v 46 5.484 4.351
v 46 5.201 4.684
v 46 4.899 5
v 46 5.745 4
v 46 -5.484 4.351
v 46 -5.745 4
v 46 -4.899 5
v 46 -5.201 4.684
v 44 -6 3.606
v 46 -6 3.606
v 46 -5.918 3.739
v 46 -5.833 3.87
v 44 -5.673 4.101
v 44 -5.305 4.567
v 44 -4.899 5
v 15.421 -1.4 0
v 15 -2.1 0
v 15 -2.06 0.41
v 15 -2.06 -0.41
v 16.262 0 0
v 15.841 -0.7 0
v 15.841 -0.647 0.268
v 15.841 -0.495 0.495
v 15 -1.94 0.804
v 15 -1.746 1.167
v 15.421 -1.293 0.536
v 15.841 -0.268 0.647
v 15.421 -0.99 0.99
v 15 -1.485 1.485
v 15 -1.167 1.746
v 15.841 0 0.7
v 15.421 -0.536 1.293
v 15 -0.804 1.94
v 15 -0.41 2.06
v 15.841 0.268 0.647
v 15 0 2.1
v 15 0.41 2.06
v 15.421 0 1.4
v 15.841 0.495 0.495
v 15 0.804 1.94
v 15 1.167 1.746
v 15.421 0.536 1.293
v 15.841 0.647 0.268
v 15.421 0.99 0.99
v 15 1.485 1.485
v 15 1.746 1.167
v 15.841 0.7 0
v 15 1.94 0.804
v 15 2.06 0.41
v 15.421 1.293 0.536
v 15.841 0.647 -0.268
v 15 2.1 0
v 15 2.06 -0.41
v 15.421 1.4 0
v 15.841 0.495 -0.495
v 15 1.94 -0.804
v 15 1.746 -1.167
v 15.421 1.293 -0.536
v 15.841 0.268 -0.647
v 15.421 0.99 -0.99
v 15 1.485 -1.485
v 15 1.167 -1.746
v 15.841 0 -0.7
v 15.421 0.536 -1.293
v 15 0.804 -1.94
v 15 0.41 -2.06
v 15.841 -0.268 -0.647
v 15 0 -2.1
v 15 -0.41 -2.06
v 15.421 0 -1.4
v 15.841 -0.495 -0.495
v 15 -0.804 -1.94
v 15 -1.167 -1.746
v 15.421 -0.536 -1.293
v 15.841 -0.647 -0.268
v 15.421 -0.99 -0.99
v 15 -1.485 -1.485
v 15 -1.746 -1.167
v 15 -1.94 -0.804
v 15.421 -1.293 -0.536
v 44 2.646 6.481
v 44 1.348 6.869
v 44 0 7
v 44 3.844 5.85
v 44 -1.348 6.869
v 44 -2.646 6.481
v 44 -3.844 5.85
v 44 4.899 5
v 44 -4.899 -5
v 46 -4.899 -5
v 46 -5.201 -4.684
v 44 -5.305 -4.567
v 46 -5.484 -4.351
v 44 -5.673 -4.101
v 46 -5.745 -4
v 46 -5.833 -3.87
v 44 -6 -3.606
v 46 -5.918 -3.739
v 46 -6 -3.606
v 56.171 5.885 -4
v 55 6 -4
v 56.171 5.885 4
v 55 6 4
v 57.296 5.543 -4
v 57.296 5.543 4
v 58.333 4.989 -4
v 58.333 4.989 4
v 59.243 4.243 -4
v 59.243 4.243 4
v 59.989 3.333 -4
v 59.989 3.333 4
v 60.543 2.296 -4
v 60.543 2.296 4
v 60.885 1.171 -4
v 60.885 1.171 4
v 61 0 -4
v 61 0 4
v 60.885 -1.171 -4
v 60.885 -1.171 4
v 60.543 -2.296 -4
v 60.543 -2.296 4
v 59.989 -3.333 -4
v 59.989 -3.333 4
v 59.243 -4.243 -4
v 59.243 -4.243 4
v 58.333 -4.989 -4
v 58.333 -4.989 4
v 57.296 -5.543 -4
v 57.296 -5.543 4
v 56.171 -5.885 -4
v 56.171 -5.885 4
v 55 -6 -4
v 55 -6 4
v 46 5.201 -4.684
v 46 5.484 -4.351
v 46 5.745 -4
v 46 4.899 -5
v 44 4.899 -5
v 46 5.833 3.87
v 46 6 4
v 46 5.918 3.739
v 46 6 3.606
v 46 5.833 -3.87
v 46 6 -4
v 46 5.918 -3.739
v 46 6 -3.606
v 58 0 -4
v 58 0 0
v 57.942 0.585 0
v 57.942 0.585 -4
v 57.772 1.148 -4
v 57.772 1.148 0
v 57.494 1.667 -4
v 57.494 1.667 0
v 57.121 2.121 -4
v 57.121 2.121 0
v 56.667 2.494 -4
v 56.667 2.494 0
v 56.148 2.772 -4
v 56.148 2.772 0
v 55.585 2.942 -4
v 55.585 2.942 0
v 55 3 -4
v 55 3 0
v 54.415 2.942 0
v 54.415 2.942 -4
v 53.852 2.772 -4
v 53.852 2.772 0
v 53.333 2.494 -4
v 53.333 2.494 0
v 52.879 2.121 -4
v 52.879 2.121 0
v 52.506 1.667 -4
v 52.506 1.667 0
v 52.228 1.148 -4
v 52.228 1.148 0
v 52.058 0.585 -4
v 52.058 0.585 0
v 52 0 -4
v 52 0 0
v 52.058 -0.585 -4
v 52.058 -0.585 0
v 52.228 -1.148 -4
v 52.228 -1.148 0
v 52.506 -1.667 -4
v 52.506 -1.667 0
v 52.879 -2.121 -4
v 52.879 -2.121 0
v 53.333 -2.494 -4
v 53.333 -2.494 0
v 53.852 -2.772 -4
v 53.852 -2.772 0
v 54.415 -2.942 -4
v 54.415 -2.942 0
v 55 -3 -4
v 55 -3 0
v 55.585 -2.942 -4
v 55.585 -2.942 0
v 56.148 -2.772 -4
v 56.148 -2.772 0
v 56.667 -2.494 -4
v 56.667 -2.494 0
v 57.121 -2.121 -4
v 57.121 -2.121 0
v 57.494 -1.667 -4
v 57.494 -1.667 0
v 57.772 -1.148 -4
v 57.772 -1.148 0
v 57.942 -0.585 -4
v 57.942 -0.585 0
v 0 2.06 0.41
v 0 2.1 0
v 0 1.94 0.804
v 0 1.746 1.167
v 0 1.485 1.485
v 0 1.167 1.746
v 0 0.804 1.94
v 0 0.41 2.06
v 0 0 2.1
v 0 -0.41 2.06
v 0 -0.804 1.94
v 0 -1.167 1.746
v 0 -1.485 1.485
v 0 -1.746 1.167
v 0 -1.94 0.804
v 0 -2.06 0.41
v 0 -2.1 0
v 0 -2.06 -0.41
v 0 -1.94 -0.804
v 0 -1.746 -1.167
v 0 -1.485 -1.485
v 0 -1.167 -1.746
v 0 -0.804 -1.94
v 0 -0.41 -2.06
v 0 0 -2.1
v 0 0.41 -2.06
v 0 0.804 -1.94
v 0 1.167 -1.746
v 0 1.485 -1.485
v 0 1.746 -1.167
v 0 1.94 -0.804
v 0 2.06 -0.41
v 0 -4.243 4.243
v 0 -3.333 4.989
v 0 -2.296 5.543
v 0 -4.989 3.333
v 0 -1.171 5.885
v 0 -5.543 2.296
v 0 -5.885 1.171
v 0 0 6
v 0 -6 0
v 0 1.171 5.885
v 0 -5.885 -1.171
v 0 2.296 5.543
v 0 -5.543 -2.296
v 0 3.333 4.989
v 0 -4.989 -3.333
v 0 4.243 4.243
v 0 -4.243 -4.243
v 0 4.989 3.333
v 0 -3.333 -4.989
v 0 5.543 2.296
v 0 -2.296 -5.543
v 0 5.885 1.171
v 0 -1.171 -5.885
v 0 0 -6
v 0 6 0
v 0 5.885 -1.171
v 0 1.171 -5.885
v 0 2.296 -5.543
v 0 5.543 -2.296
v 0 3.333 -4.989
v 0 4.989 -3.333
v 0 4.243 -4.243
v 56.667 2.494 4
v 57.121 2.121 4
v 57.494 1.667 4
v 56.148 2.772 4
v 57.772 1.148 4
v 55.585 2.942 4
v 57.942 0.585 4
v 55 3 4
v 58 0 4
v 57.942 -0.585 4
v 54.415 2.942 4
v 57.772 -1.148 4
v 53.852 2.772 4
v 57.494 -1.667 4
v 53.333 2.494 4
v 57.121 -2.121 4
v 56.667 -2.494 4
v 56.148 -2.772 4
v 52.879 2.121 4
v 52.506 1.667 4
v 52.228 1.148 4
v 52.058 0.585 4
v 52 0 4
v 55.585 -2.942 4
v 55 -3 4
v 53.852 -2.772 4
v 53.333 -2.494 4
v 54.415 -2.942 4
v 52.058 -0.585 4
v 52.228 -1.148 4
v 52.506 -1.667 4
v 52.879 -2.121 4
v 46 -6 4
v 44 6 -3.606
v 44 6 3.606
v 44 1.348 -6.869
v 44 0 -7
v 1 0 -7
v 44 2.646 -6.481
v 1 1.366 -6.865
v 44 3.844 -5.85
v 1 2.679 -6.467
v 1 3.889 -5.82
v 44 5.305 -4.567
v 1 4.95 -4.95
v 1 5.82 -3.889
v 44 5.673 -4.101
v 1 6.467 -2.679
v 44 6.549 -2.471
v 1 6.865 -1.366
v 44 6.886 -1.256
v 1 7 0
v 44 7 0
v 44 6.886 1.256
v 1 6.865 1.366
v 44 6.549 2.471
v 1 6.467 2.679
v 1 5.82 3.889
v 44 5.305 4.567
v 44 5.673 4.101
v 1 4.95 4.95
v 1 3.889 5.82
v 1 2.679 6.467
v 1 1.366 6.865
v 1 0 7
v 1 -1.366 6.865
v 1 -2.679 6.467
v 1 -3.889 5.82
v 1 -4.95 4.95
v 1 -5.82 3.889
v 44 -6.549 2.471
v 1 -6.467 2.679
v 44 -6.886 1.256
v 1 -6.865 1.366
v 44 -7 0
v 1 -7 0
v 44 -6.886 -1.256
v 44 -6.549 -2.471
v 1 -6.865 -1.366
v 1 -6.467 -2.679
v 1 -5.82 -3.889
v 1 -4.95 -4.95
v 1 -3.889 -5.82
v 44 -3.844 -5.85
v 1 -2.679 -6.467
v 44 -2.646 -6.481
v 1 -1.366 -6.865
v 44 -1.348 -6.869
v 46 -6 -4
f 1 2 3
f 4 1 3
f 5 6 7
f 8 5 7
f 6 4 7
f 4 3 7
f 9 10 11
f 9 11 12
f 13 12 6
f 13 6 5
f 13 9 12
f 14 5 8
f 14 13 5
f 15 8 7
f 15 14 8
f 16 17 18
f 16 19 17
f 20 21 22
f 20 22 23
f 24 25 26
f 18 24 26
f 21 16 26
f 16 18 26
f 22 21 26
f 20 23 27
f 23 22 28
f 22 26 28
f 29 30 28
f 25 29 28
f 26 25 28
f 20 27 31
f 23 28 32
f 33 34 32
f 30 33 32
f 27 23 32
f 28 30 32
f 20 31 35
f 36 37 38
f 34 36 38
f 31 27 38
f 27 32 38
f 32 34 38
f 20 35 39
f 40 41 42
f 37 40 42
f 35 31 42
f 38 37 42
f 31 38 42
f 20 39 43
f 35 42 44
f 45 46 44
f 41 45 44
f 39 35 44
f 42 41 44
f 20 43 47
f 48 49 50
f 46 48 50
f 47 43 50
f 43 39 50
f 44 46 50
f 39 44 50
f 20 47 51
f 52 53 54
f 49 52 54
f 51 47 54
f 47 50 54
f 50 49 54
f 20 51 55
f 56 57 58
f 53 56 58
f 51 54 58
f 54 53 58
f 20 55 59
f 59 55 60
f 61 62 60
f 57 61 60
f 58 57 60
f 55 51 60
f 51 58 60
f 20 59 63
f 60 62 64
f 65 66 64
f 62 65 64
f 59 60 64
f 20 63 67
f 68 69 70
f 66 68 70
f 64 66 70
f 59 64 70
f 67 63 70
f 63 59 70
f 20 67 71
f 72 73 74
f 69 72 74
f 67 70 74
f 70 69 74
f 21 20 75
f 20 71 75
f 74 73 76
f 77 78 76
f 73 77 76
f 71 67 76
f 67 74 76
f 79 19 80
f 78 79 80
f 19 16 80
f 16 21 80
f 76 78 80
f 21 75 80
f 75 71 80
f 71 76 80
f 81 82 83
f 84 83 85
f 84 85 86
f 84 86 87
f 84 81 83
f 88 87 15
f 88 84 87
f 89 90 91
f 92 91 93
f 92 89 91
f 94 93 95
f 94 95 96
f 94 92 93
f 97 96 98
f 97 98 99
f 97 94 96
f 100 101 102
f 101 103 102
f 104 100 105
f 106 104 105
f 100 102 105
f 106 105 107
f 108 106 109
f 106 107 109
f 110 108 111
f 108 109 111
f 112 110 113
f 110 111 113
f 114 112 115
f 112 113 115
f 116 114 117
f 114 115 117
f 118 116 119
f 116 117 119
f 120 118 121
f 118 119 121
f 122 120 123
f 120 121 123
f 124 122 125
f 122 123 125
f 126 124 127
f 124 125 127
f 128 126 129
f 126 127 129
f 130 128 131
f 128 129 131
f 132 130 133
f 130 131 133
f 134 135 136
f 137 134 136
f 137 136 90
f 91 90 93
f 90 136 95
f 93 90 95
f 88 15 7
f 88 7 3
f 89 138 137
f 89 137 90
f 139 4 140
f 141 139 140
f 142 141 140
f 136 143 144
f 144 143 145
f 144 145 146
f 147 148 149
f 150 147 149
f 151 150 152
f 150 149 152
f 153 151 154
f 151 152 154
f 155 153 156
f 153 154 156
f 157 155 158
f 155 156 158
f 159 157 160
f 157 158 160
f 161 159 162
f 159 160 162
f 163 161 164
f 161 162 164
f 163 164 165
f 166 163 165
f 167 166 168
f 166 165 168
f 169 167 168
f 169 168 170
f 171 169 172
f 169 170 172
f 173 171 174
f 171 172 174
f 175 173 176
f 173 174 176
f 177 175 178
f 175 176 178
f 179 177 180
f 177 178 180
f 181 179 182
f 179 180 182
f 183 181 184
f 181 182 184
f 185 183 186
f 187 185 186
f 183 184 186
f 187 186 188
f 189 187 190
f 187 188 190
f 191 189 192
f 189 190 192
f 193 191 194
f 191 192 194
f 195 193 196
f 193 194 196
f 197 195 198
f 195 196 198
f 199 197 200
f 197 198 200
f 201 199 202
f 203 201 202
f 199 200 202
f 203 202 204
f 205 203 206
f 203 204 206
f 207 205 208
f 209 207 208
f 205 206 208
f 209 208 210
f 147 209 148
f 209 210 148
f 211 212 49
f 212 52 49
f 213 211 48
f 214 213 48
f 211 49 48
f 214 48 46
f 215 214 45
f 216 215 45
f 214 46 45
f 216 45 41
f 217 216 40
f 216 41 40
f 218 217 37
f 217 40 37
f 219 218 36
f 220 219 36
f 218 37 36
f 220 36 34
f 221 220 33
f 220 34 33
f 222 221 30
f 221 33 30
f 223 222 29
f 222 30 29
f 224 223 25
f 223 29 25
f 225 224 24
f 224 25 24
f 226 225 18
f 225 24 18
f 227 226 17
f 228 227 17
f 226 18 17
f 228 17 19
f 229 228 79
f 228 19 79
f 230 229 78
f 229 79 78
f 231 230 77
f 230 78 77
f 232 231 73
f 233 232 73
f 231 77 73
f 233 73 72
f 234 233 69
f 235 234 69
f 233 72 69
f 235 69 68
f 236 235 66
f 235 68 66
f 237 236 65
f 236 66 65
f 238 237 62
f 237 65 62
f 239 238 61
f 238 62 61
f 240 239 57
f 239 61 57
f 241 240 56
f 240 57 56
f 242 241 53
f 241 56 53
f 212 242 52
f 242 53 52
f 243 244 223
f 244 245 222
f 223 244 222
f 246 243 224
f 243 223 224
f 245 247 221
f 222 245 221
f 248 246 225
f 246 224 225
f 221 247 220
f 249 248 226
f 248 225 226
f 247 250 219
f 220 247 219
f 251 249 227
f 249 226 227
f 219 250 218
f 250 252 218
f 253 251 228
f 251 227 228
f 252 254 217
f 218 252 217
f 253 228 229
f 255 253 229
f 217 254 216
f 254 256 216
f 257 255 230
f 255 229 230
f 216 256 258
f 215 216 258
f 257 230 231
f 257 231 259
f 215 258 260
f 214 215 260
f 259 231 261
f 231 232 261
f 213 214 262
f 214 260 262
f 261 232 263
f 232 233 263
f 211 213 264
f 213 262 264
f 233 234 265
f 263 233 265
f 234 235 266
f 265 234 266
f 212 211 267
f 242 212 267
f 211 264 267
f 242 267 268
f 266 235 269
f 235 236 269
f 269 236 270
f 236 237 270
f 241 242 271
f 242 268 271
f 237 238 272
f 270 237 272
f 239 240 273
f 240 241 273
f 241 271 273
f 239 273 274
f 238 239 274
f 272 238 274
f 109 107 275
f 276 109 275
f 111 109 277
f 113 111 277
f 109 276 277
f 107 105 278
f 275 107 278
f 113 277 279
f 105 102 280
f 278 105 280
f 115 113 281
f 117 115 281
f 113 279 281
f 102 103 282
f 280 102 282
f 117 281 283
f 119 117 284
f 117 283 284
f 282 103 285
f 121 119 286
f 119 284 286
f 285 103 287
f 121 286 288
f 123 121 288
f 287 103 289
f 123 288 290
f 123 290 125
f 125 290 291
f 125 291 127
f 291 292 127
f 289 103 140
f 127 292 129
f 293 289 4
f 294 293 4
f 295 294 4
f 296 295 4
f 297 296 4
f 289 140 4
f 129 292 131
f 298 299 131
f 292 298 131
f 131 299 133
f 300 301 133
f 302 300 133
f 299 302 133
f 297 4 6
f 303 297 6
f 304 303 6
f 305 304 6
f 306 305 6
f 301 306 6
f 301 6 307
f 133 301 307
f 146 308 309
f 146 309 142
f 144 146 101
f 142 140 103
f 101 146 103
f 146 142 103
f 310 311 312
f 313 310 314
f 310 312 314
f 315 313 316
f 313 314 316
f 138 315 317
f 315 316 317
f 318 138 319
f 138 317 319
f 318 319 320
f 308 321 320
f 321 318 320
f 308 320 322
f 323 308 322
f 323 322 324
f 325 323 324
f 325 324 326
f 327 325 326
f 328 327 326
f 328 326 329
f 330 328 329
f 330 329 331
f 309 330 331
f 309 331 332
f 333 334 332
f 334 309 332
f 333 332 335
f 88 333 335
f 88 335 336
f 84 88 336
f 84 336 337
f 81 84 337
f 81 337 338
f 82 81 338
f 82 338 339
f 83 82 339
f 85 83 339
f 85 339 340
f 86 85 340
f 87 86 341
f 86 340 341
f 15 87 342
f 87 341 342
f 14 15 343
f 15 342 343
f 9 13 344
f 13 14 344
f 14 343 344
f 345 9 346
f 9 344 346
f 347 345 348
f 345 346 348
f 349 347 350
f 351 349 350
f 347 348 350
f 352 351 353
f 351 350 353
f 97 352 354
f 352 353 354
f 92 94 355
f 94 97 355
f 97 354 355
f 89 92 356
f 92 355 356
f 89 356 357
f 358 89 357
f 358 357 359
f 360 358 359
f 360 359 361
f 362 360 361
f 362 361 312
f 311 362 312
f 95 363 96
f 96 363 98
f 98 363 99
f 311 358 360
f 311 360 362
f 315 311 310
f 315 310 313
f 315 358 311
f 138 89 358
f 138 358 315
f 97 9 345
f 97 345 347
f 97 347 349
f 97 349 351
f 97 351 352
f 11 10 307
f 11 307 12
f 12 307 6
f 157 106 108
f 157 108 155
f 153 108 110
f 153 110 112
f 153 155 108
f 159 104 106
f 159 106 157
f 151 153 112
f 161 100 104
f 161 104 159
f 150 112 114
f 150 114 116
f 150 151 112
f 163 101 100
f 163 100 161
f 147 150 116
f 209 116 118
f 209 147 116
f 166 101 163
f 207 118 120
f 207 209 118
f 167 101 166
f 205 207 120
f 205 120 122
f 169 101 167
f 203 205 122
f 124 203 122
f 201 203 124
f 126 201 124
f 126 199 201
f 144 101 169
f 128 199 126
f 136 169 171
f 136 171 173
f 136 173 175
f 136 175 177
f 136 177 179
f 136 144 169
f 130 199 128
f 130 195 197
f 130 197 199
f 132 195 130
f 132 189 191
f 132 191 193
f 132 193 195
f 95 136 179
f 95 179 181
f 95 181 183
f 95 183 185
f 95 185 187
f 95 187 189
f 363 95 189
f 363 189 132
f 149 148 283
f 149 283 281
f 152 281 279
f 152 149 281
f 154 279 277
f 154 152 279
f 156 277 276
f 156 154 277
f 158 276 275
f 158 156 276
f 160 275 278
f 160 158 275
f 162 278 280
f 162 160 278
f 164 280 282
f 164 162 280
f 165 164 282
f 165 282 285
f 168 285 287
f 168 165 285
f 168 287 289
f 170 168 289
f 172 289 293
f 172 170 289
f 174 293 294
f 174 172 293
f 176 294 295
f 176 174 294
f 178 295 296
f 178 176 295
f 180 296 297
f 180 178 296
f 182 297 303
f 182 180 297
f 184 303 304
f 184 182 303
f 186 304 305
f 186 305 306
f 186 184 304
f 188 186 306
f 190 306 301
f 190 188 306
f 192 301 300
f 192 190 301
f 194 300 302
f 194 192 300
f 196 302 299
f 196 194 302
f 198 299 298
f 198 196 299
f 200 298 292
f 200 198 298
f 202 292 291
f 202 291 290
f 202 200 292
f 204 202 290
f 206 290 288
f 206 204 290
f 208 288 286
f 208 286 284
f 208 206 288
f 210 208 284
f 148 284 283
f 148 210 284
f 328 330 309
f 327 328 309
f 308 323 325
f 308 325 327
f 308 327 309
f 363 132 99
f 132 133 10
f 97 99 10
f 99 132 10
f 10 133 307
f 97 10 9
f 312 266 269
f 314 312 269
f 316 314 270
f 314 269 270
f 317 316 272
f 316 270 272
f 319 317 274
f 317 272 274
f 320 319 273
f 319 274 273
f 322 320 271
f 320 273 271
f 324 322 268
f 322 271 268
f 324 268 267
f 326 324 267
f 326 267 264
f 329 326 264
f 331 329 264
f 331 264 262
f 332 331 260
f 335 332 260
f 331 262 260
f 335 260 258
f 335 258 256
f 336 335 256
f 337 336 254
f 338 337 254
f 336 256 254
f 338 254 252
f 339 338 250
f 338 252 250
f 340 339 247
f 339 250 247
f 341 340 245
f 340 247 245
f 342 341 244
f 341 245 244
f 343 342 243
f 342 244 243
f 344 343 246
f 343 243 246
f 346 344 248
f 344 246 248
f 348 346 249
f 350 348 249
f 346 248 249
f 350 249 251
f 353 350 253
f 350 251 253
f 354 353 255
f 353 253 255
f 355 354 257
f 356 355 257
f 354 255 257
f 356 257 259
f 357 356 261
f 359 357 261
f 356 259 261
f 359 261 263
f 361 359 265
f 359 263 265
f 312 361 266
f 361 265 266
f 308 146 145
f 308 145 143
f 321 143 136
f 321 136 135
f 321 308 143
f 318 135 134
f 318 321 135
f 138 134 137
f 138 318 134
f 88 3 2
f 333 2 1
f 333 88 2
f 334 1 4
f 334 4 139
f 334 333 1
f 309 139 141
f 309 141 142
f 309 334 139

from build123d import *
from build123d.topology import SkipClean

# Parameters (mm, degrees)
SKETCH1_R                   = 7
BOSS_EXTRUDE1_DEPTH         = 44
BOSS_EXTRUDE2_DEPTH         = 2
SKETCH3_R                   = 3
BOSS_EXTRUDE3_DEPTH         = 4
TAP_DRILL_FOR_M5_TAP1_D     = 4.2
TAP_DRILL_FOR_M5_TAP1_DEPTH = 15
TAP_DRILL_FOR_M5_TAP1_TIP   = 1.2618073
CHAMFER1_SIZE               = 1


with BuildPart() as part:
    # Sketch1 → Boss-Extrude1 (new body)
    with BuildSketch(Plane.YZ):
        with Locations(Location((0, 0, 0), (0, 0, 270))):
            Circle(SKETCH1_R)
    extrude(amount=BOSS_EXTRUDE1_DEPTH)

    # Sketch2 → Boss-Extrude2 (add)
    with SkipClean():  # the faces are left unmerged after this step: merging them gives an invalid solid
        with BuildSketch(Plane.YZ.offset(44)):
            with BuildLine():
                Line((-4.898979486, 5), (4.898979486, 5))
                ThreePointArc((4.898979486, 5), (5.4939112, 4.337849667), (6, 3.605551275))
                Line((6, 3.605551275), (6, -3.605551275))
                ThreePointArc((6, -3.605551275), (5.4939112, -4.337849667), (4.898979486, -5))
                Line((4.898979486, -5), (-4.898979486, -5))
                ThreePointArc((-4.898979486, -5), (-5.4939112, -4.337849667), (-6, -3.605551275))
                Line((-6, -3.605551275), (-6, 3.605551275))
                ThreePointArc((-6, 3.605551275), (-5.4939112, 4.337849667), (-4.898979486, 5))
            make_face()
        extrude(amount=BOSS_EXTRUDE2_DEPTH)

    # Sketch3 → Boss-Extrude3 (add, symmetric)
    with SkipClean():  # the faces are left unmerged after this step: merging them gives an invalid solid
        with BuildSketch(Plane(origin=(0, 0, 0), x_dir=(0, 1, 0), z_dir=(0, 0, 1))):
            with BuildLine():
                Line((-6, -46), (6, -46))
                Line((6, -46), (6, -55))
                ThreePointArc((6, -55), (0, -61), (-6, -55))
                Line((-6, -55), (-6, -46))
            make_face()
            with Locations(Location((0, -55, 0), (0, 0, 270))):
                Circle(SKETCH3_R, mode=Mode.SUBTRACT)
        extrude(amount=BOSS_EXTRUDE3_DEPTH, both=True)

    # Tap Drill for M5 Tap1
    with Locations(Plane(origin=(0, 0, 0), x_dir=(0, -1, 0), z_dir=(-1, 0, 0))):
        with Locations((0, 0)):
            Hole(TAP_DRILL_FOR_M5_TAP1_D / 2, depth=TAP_DRILL_FOR_M5_TAP1_DEPTH)
            with Locations((0, 0, -(TAP_DRILL_FOR_M5_TAP1_DEPTH + TAP_DRILL_FOR_M5_TAP1_TIP / 2))):  # 118° drill point
                Cone(0, TAP_DRILL_FOR_M5_TAP1_D / 2, TAP_DRILL_FOR_M5_TAP1_TIP, mode=Mode.SUBTRACT)

    # Chamfer1
    chamfer1_edges = [part.edges().sort_by_distance(p)[0] for p in [
        (0, 0, 7),
    ]]
    chamfer(chamfer1_edges, length=CHAMFER1_SIZE)


solid = part.part
